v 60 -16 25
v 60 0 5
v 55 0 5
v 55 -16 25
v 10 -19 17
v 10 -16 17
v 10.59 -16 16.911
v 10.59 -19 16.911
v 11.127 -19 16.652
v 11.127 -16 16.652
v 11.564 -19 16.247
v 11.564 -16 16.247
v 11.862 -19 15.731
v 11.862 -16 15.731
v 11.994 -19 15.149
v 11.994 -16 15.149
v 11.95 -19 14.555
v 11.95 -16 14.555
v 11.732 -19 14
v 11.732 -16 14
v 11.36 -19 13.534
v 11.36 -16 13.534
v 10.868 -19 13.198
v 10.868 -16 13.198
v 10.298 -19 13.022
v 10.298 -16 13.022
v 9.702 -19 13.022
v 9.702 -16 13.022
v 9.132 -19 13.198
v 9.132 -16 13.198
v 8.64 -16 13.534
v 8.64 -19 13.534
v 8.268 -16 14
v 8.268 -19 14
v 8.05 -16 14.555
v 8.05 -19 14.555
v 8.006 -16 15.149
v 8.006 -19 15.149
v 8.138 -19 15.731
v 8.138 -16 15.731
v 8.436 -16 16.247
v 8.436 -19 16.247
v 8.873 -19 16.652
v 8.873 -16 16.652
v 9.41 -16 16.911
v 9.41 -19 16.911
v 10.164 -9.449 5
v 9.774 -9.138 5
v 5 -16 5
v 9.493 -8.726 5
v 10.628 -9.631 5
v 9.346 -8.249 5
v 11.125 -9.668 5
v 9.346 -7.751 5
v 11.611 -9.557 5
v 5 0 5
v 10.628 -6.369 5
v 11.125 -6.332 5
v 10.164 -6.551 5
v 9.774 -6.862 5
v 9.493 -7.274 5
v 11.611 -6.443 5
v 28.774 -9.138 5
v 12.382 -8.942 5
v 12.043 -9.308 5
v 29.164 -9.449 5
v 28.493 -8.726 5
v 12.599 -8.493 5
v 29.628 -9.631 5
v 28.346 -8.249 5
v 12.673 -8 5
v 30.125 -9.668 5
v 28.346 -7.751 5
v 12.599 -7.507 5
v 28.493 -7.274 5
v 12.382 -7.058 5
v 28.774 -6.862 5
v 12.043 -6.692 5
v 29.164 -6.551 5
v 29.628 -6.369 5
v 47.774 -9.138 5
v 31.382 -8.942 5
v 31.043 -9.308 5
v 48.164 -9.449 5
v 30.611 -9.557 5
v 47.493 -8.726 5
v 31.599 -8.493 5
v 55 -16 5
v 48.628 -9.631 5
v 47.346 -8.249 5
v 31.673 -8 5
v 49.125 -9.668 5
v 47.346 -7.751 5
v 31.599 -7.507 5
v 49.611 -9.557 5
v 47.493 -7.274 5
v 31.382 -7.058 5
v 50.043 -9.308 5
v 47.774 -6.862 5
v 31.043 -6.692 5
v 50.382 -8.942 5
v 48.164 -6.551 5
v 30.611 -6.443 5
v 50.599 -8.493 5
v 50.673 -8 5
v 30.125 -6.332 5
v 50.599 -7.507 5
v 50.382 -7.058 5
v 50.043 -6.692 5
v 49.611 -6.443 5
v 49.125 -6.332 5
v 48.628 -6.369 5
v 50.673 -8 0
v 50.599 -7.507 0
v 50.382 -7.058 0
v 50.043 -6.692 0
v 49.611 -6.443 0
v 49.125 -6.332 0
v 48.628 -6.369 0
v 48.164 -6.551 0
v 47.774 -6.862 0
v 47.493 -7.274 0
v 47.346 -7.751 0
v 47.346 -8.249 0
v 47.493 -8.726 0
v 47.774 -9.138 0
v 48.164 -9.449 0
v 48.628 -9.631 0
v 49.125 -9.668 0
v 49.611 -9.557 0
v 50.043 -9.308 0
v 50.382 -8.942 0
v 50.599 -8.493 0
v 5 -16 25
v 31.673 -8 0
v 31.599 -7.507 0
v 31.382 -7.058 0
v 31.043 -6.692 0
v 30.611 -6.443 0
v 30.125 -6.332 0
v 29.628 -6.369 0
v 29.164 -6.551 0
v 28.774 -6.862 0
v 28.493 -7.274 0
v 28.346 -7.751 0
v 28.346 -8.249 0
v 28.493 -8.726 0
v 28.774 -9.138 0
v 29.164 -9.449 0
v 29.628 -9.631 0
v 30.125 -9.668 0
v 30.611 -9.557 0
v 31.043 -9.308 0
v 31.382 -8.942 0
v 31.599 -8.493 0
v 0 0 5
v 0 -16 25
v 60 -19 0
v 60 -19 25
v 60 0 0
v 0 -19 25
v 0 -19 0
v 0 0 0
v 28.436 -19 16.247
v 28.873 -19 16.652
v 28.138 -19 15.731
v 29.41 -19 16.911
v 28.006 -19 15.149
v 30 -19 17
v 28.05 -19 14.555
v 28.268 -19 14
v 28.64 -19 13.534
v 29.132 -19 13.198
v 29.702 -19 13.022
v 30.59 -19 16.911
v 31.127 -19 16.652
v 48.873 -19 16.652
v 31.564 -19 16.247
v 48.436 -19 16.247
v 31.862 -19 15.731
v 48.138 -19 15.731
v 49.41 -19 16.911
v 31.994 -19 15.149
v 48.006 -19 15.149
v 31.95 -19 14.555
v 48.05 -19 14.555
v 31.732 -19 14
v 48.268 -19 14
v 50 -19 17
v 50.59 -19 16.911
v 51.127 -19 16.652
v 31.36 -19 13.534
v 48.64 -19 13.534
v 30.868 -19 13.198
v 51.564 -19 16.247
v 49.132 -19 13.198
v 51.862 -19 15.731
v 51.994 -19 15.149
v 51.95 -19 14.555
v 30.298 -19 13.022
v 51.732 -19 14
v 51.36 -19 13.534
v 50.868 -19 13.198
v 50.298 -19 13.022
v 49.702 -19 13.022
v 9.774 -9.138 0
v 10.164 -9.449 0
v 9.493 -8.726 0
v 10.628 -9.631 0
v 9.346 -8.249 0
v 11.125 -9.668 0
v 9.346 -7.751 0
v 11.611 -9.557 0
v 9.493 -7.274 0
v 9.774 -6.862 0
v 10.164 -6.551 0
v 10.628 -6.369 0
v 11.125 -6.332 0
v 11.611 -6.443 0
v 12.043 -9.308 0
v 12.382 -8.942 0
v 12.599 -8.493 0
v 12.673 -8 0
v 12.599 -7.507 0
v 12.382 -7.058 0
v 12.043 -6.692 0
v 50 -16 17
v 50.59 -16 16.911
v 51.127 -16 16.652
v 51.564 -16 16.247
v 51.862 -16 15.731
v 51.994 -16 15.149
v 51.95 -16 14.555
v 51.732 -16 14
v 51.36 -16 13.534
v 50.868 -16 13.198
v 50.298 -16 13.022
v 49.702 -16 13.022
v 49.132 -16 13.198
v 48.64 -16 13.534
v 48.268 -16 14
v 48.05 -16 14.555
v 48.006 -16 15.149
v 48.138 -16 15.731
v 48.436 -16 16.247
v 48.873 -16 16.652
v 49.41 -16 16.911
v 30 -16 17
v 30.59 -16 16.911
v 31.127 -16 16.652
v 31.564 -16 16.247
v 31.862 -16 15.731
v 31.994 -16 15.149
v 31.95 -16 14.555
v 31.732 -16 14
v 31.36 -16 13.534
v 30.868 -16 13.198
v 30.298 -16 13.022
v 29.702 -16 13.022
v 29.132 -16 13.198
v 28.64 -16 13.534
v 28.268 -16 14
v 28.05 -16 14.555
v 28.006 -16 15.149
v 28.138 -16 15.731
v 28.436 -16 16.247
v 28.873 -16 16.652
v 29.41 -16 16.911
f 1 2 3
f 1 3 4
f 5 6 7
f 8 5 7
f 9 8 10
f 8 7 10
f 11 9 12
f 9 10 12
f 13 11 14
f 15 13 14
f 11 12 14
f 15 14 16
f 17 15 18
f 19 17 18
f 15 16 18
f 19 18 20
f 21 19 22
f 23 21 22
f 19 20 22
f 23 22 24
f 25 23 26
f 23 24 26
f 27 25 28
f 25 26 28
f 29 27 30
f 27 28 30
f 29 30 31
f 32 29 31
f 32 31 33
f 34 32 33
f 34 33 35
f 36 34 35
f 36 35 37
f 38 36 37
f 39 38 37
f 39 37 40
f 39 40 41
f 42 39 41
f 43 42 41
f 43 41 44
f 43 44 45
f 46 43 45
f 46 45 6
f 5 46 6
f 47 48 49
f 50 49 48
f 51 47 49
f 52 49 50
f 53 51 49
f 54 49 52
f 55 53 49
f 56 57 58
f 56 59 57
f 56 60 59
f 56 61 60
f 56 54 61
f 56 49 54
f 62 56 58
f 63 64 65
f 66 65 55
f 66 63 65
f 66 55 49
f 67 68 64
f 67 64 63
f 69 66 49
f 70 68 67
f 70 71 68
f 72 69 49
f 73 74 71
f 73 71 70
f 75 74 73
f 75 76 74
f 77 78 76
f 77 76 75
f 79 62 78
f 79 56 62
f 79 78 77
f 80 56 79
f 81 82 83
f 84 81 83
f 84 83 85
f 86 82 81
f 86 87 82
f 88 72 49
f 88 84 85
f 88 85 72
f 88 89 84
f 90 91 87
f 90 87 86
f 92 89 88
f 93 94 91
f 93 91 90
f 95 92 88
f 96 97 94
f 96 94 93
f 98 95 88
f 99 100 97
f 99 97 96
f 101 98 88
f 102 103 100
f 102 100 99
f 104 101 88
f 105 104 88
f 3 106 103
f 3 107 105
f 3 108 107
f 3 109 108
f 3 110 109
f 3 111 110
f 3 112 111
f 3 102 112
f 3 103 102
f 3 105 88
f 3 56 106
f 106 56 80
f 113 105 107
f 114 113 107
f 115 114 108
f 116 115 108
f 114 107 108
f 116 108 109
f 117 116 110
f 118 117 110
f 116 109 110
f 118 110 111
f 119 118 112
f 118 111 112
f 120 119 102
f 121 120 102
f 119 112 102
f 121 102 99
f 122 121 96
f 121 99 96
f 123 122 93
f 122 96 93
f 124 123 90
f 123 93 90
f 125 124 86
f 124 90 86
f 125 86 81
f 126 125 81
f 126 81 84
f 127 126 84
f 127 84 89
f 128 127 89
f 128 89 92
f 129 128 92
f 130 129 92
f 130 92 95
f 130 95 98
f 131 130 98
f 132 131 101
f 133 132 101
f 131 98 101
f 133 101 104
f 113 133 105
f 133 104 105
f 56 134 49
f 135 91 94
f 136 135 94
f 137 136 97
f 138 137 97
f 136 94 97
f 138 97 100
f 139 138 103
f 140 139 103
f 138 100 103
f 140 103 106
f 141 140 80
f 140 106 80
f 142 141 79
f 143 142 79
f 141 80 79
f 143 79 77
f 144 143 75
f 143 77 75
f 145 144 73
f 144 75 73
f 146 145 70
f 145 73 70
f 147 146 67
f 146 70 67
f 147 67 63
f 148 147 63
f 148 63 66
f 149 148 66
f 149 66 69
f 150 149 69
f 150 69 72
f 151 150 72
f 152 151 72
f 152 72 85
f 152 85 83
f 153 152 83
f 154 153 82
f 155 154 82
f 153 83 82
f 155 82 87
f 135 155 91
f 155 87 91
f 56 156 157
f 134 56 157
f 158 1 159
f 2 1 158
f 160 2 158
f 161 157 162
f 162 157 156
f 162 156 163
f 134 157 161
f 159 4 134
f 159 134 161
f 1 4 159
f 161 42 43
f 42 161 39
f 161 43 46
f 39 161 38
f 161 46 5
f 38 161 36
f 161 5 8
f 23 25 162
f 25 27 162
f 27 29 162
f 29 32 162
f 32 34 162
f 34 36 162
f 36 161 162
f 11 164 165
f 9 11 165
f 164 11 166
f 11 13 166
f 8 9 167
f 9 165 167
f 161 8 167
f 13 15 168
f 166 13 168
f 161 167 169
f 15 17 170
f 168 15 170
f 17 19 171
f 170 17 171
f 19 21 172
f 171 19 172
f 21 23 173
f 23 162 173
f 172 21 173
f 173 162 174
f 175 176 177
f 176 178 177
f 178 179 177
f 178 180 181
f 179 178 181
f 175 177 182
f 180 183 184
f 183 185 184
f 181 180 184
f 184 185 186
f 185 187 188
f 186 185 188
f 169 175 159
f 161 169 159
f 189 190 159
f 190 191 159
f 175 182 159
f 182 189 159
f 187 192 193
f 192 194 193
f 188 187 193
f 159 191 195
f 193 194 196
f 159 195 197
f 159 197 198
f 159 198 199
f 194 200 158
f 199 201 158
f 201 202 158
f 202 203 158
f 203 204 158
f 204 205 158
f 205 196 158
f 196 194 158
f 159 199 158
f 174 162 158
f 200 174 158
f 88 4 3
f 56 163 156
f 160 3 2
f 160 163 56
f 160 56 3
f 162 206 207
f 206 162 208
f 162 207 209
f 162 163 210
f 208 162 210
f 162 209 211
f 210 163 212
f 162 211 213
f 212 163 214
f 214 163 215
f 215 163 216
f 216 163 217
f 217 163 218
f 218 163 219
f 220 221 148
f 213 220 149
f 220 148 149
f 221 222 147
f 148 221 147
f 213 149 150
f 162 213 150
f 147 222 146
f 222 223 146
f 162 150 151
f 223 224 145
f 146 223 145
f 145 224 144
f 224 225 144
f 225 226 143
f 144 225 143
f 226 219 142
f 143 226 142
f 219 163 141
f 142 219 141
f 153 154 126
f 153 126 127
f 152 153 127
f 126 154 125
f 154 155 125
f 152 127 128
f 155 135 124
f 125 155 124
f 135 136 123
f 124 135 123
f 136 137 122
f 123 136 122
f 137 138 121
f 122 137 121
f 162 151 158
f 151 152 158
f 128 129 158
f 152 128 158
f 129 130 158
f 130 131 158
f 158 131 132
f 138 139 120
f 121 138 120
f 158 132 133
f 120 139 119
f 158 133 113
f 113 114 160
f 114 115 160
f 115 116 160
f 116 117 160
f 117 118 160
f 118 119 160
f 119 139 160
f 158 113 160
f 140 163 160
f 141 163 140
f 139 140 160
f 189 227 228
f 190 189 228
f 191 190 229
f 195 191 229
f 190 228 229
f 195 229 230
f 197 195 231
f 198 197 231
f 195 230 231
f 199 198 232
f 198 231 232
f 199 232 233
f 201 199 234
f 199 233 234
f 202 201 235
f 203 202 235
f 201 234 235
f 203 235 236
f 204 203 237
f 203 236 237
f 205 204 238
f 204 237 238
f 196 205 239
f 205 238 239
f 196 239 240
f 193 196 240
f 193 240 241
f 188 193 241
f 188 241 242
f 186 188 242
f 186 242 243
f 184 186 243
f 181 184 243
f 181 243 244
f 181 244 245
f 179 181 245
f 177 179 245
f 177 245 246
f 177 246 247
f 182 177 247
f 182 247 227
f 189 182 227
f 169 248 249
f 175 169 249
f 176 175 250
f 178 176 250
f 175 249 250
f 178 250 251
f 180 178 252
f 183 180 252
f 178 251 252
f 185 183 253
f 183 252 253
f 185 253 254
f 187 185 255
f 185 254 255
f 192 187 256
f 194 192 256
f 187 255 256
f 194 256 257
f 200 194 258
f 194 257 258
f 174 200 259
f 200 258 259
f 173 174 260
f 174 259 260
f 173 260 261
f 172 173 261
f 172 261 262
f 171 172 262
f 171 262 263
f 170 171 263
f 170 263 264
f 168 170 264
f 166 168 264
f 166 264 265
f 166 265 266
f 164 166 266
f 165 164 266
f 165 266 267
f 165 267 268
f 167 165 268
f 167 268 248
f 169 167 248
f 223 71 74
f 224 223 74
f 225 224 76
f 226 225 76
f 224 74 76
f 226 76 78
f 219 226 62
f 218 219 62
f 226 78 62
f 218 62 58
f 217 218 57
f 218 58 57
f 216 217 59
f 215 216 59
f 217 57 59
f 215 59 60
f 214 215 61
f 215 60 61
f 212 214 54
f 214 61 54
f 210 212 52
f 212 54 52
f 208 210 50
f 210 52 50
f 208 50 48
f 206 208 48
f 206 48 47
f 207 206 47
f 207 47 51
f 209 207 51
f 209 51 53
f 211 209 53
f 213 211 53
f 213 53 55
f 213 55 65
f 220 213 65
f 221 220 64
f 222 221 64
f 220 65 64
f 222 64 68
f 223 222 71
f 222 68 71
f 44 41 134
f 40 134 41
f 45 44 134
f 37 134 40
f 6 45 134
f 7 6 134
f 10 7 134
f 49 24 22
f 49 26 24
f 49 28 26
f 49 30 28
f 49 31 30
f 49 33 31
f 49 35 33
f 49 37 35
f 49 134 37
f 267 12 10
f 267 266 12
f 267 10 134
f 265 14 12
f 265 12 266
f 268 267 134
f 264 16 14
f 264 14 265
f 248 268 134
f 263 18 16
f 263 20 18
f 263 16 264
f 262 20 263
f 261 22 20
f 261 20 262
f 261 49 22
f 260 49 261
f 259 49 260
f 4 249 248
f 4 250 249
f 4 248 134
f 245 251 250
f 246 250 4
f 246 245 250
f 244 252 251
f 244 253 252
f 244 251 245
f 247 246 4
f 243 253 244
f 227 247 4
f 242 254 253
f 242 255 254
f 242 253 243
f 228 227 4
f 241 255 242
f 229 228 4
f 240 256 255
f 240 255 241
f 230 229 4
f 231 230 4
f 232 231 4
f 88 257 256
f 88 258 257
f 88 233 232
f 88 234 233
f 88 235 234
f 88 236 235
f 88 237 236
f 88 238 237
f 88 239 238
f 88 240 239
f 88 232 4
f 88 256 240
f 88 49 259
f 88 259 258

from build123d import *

# Parameters (mm, degrees)
SKETCH1_W           = 60
SKETCH1_H           = 19
BOSS_EXTRUDE1_DEPTH = 5
SKETCH2_W           = 60
SKETCH2_H           = 3
BOSS_EXTRUDE2_DEPTH = 20
BOSS_EXTRUDE3_DEPTH = 5
SKETCH4_R           = 1.67292172
CUT_EXTRUDE1_DEPTH  = 5
SKETCH5_R           = 2
CUT_EXTRUDE2_DEPTH  = 5


with BuildPart() as part:
    # Sketch1 → Boss-Extrude1 (new body)
    with BuildSketch(Plane.XY):
        with Locations((30, -9.5)):
            Rectangle(SKETCH1_W, SKETCH1_H)
    extrude(amount=BOSS_EXTRUDE1_DEPTH)

    # Sketch2 → Boss-Extrude2 (add)
    with BuildSketch(Plane.XY.offset(5)):
        with Locations((30, -17.5)):
            Rectangle(SKETCH2_W, SKETCH2_H)
    extrude(amount=BOSS_EXTRUDE2_DEPTH)

    # Sketch3 → Boss-Extrude3 (add)
    with BuildSketch(Plane(origin=(60, 0, 0), x_dir=(0, 0, -1), z_dir=(1, 0, 0))):
        Polygon((-5, 0), (-25, -16), (-5, -16), align=None)
    boss_extrude3 = extrude(amount=-BOSS_EXTRUDE3_DEPTH)

    # Mirror1: Boss-Extrude3 across plane
    add(boss_extrude3.mirror(Plane(origin=(30, 0, 0), x_dir=(0, 0, 1), z_dir=(1, 0, 0))))

    # Sketch4 → Cut-Extrude1 (cut)
    with BuildSketch(Plane.XY.offset(5)):
        with Locations((11, -8)):
            Circle(SKETCH4_R)
        with Locations((30, -8)):
            Circle(SKETCH4_R)
        with Locations((49, -8)):
            Circle(SKETCH4_R)
    extrude(amount=-CUT_EXTRUDE1_DEPTH, mode=Mode.SUBTRACT)

    # Sketch5 → Cut-Extrude2 (cut)
    with BuildSketch(Plane(origin=(0, -16, 0), x_dir=(1, 0, 0), z_dir=(0, 1, 0))):
        with Locations(Location((10, -15, 0), (0, 0, 270))):
            Circle(SKETCH5_R)
        with Locations(Location((30, -15, 0), (0, 0, 270))):
            Circle(SKETCH5_R)
        with Locations(Location((50, -15, 0), (0, 0, 270))):
            Circle(SKETCH5_R)
    extrude(amount=-CUT_EXTRUDE2_DEPTH, mode=Mode.SUBTRACT)


solid = part.part
